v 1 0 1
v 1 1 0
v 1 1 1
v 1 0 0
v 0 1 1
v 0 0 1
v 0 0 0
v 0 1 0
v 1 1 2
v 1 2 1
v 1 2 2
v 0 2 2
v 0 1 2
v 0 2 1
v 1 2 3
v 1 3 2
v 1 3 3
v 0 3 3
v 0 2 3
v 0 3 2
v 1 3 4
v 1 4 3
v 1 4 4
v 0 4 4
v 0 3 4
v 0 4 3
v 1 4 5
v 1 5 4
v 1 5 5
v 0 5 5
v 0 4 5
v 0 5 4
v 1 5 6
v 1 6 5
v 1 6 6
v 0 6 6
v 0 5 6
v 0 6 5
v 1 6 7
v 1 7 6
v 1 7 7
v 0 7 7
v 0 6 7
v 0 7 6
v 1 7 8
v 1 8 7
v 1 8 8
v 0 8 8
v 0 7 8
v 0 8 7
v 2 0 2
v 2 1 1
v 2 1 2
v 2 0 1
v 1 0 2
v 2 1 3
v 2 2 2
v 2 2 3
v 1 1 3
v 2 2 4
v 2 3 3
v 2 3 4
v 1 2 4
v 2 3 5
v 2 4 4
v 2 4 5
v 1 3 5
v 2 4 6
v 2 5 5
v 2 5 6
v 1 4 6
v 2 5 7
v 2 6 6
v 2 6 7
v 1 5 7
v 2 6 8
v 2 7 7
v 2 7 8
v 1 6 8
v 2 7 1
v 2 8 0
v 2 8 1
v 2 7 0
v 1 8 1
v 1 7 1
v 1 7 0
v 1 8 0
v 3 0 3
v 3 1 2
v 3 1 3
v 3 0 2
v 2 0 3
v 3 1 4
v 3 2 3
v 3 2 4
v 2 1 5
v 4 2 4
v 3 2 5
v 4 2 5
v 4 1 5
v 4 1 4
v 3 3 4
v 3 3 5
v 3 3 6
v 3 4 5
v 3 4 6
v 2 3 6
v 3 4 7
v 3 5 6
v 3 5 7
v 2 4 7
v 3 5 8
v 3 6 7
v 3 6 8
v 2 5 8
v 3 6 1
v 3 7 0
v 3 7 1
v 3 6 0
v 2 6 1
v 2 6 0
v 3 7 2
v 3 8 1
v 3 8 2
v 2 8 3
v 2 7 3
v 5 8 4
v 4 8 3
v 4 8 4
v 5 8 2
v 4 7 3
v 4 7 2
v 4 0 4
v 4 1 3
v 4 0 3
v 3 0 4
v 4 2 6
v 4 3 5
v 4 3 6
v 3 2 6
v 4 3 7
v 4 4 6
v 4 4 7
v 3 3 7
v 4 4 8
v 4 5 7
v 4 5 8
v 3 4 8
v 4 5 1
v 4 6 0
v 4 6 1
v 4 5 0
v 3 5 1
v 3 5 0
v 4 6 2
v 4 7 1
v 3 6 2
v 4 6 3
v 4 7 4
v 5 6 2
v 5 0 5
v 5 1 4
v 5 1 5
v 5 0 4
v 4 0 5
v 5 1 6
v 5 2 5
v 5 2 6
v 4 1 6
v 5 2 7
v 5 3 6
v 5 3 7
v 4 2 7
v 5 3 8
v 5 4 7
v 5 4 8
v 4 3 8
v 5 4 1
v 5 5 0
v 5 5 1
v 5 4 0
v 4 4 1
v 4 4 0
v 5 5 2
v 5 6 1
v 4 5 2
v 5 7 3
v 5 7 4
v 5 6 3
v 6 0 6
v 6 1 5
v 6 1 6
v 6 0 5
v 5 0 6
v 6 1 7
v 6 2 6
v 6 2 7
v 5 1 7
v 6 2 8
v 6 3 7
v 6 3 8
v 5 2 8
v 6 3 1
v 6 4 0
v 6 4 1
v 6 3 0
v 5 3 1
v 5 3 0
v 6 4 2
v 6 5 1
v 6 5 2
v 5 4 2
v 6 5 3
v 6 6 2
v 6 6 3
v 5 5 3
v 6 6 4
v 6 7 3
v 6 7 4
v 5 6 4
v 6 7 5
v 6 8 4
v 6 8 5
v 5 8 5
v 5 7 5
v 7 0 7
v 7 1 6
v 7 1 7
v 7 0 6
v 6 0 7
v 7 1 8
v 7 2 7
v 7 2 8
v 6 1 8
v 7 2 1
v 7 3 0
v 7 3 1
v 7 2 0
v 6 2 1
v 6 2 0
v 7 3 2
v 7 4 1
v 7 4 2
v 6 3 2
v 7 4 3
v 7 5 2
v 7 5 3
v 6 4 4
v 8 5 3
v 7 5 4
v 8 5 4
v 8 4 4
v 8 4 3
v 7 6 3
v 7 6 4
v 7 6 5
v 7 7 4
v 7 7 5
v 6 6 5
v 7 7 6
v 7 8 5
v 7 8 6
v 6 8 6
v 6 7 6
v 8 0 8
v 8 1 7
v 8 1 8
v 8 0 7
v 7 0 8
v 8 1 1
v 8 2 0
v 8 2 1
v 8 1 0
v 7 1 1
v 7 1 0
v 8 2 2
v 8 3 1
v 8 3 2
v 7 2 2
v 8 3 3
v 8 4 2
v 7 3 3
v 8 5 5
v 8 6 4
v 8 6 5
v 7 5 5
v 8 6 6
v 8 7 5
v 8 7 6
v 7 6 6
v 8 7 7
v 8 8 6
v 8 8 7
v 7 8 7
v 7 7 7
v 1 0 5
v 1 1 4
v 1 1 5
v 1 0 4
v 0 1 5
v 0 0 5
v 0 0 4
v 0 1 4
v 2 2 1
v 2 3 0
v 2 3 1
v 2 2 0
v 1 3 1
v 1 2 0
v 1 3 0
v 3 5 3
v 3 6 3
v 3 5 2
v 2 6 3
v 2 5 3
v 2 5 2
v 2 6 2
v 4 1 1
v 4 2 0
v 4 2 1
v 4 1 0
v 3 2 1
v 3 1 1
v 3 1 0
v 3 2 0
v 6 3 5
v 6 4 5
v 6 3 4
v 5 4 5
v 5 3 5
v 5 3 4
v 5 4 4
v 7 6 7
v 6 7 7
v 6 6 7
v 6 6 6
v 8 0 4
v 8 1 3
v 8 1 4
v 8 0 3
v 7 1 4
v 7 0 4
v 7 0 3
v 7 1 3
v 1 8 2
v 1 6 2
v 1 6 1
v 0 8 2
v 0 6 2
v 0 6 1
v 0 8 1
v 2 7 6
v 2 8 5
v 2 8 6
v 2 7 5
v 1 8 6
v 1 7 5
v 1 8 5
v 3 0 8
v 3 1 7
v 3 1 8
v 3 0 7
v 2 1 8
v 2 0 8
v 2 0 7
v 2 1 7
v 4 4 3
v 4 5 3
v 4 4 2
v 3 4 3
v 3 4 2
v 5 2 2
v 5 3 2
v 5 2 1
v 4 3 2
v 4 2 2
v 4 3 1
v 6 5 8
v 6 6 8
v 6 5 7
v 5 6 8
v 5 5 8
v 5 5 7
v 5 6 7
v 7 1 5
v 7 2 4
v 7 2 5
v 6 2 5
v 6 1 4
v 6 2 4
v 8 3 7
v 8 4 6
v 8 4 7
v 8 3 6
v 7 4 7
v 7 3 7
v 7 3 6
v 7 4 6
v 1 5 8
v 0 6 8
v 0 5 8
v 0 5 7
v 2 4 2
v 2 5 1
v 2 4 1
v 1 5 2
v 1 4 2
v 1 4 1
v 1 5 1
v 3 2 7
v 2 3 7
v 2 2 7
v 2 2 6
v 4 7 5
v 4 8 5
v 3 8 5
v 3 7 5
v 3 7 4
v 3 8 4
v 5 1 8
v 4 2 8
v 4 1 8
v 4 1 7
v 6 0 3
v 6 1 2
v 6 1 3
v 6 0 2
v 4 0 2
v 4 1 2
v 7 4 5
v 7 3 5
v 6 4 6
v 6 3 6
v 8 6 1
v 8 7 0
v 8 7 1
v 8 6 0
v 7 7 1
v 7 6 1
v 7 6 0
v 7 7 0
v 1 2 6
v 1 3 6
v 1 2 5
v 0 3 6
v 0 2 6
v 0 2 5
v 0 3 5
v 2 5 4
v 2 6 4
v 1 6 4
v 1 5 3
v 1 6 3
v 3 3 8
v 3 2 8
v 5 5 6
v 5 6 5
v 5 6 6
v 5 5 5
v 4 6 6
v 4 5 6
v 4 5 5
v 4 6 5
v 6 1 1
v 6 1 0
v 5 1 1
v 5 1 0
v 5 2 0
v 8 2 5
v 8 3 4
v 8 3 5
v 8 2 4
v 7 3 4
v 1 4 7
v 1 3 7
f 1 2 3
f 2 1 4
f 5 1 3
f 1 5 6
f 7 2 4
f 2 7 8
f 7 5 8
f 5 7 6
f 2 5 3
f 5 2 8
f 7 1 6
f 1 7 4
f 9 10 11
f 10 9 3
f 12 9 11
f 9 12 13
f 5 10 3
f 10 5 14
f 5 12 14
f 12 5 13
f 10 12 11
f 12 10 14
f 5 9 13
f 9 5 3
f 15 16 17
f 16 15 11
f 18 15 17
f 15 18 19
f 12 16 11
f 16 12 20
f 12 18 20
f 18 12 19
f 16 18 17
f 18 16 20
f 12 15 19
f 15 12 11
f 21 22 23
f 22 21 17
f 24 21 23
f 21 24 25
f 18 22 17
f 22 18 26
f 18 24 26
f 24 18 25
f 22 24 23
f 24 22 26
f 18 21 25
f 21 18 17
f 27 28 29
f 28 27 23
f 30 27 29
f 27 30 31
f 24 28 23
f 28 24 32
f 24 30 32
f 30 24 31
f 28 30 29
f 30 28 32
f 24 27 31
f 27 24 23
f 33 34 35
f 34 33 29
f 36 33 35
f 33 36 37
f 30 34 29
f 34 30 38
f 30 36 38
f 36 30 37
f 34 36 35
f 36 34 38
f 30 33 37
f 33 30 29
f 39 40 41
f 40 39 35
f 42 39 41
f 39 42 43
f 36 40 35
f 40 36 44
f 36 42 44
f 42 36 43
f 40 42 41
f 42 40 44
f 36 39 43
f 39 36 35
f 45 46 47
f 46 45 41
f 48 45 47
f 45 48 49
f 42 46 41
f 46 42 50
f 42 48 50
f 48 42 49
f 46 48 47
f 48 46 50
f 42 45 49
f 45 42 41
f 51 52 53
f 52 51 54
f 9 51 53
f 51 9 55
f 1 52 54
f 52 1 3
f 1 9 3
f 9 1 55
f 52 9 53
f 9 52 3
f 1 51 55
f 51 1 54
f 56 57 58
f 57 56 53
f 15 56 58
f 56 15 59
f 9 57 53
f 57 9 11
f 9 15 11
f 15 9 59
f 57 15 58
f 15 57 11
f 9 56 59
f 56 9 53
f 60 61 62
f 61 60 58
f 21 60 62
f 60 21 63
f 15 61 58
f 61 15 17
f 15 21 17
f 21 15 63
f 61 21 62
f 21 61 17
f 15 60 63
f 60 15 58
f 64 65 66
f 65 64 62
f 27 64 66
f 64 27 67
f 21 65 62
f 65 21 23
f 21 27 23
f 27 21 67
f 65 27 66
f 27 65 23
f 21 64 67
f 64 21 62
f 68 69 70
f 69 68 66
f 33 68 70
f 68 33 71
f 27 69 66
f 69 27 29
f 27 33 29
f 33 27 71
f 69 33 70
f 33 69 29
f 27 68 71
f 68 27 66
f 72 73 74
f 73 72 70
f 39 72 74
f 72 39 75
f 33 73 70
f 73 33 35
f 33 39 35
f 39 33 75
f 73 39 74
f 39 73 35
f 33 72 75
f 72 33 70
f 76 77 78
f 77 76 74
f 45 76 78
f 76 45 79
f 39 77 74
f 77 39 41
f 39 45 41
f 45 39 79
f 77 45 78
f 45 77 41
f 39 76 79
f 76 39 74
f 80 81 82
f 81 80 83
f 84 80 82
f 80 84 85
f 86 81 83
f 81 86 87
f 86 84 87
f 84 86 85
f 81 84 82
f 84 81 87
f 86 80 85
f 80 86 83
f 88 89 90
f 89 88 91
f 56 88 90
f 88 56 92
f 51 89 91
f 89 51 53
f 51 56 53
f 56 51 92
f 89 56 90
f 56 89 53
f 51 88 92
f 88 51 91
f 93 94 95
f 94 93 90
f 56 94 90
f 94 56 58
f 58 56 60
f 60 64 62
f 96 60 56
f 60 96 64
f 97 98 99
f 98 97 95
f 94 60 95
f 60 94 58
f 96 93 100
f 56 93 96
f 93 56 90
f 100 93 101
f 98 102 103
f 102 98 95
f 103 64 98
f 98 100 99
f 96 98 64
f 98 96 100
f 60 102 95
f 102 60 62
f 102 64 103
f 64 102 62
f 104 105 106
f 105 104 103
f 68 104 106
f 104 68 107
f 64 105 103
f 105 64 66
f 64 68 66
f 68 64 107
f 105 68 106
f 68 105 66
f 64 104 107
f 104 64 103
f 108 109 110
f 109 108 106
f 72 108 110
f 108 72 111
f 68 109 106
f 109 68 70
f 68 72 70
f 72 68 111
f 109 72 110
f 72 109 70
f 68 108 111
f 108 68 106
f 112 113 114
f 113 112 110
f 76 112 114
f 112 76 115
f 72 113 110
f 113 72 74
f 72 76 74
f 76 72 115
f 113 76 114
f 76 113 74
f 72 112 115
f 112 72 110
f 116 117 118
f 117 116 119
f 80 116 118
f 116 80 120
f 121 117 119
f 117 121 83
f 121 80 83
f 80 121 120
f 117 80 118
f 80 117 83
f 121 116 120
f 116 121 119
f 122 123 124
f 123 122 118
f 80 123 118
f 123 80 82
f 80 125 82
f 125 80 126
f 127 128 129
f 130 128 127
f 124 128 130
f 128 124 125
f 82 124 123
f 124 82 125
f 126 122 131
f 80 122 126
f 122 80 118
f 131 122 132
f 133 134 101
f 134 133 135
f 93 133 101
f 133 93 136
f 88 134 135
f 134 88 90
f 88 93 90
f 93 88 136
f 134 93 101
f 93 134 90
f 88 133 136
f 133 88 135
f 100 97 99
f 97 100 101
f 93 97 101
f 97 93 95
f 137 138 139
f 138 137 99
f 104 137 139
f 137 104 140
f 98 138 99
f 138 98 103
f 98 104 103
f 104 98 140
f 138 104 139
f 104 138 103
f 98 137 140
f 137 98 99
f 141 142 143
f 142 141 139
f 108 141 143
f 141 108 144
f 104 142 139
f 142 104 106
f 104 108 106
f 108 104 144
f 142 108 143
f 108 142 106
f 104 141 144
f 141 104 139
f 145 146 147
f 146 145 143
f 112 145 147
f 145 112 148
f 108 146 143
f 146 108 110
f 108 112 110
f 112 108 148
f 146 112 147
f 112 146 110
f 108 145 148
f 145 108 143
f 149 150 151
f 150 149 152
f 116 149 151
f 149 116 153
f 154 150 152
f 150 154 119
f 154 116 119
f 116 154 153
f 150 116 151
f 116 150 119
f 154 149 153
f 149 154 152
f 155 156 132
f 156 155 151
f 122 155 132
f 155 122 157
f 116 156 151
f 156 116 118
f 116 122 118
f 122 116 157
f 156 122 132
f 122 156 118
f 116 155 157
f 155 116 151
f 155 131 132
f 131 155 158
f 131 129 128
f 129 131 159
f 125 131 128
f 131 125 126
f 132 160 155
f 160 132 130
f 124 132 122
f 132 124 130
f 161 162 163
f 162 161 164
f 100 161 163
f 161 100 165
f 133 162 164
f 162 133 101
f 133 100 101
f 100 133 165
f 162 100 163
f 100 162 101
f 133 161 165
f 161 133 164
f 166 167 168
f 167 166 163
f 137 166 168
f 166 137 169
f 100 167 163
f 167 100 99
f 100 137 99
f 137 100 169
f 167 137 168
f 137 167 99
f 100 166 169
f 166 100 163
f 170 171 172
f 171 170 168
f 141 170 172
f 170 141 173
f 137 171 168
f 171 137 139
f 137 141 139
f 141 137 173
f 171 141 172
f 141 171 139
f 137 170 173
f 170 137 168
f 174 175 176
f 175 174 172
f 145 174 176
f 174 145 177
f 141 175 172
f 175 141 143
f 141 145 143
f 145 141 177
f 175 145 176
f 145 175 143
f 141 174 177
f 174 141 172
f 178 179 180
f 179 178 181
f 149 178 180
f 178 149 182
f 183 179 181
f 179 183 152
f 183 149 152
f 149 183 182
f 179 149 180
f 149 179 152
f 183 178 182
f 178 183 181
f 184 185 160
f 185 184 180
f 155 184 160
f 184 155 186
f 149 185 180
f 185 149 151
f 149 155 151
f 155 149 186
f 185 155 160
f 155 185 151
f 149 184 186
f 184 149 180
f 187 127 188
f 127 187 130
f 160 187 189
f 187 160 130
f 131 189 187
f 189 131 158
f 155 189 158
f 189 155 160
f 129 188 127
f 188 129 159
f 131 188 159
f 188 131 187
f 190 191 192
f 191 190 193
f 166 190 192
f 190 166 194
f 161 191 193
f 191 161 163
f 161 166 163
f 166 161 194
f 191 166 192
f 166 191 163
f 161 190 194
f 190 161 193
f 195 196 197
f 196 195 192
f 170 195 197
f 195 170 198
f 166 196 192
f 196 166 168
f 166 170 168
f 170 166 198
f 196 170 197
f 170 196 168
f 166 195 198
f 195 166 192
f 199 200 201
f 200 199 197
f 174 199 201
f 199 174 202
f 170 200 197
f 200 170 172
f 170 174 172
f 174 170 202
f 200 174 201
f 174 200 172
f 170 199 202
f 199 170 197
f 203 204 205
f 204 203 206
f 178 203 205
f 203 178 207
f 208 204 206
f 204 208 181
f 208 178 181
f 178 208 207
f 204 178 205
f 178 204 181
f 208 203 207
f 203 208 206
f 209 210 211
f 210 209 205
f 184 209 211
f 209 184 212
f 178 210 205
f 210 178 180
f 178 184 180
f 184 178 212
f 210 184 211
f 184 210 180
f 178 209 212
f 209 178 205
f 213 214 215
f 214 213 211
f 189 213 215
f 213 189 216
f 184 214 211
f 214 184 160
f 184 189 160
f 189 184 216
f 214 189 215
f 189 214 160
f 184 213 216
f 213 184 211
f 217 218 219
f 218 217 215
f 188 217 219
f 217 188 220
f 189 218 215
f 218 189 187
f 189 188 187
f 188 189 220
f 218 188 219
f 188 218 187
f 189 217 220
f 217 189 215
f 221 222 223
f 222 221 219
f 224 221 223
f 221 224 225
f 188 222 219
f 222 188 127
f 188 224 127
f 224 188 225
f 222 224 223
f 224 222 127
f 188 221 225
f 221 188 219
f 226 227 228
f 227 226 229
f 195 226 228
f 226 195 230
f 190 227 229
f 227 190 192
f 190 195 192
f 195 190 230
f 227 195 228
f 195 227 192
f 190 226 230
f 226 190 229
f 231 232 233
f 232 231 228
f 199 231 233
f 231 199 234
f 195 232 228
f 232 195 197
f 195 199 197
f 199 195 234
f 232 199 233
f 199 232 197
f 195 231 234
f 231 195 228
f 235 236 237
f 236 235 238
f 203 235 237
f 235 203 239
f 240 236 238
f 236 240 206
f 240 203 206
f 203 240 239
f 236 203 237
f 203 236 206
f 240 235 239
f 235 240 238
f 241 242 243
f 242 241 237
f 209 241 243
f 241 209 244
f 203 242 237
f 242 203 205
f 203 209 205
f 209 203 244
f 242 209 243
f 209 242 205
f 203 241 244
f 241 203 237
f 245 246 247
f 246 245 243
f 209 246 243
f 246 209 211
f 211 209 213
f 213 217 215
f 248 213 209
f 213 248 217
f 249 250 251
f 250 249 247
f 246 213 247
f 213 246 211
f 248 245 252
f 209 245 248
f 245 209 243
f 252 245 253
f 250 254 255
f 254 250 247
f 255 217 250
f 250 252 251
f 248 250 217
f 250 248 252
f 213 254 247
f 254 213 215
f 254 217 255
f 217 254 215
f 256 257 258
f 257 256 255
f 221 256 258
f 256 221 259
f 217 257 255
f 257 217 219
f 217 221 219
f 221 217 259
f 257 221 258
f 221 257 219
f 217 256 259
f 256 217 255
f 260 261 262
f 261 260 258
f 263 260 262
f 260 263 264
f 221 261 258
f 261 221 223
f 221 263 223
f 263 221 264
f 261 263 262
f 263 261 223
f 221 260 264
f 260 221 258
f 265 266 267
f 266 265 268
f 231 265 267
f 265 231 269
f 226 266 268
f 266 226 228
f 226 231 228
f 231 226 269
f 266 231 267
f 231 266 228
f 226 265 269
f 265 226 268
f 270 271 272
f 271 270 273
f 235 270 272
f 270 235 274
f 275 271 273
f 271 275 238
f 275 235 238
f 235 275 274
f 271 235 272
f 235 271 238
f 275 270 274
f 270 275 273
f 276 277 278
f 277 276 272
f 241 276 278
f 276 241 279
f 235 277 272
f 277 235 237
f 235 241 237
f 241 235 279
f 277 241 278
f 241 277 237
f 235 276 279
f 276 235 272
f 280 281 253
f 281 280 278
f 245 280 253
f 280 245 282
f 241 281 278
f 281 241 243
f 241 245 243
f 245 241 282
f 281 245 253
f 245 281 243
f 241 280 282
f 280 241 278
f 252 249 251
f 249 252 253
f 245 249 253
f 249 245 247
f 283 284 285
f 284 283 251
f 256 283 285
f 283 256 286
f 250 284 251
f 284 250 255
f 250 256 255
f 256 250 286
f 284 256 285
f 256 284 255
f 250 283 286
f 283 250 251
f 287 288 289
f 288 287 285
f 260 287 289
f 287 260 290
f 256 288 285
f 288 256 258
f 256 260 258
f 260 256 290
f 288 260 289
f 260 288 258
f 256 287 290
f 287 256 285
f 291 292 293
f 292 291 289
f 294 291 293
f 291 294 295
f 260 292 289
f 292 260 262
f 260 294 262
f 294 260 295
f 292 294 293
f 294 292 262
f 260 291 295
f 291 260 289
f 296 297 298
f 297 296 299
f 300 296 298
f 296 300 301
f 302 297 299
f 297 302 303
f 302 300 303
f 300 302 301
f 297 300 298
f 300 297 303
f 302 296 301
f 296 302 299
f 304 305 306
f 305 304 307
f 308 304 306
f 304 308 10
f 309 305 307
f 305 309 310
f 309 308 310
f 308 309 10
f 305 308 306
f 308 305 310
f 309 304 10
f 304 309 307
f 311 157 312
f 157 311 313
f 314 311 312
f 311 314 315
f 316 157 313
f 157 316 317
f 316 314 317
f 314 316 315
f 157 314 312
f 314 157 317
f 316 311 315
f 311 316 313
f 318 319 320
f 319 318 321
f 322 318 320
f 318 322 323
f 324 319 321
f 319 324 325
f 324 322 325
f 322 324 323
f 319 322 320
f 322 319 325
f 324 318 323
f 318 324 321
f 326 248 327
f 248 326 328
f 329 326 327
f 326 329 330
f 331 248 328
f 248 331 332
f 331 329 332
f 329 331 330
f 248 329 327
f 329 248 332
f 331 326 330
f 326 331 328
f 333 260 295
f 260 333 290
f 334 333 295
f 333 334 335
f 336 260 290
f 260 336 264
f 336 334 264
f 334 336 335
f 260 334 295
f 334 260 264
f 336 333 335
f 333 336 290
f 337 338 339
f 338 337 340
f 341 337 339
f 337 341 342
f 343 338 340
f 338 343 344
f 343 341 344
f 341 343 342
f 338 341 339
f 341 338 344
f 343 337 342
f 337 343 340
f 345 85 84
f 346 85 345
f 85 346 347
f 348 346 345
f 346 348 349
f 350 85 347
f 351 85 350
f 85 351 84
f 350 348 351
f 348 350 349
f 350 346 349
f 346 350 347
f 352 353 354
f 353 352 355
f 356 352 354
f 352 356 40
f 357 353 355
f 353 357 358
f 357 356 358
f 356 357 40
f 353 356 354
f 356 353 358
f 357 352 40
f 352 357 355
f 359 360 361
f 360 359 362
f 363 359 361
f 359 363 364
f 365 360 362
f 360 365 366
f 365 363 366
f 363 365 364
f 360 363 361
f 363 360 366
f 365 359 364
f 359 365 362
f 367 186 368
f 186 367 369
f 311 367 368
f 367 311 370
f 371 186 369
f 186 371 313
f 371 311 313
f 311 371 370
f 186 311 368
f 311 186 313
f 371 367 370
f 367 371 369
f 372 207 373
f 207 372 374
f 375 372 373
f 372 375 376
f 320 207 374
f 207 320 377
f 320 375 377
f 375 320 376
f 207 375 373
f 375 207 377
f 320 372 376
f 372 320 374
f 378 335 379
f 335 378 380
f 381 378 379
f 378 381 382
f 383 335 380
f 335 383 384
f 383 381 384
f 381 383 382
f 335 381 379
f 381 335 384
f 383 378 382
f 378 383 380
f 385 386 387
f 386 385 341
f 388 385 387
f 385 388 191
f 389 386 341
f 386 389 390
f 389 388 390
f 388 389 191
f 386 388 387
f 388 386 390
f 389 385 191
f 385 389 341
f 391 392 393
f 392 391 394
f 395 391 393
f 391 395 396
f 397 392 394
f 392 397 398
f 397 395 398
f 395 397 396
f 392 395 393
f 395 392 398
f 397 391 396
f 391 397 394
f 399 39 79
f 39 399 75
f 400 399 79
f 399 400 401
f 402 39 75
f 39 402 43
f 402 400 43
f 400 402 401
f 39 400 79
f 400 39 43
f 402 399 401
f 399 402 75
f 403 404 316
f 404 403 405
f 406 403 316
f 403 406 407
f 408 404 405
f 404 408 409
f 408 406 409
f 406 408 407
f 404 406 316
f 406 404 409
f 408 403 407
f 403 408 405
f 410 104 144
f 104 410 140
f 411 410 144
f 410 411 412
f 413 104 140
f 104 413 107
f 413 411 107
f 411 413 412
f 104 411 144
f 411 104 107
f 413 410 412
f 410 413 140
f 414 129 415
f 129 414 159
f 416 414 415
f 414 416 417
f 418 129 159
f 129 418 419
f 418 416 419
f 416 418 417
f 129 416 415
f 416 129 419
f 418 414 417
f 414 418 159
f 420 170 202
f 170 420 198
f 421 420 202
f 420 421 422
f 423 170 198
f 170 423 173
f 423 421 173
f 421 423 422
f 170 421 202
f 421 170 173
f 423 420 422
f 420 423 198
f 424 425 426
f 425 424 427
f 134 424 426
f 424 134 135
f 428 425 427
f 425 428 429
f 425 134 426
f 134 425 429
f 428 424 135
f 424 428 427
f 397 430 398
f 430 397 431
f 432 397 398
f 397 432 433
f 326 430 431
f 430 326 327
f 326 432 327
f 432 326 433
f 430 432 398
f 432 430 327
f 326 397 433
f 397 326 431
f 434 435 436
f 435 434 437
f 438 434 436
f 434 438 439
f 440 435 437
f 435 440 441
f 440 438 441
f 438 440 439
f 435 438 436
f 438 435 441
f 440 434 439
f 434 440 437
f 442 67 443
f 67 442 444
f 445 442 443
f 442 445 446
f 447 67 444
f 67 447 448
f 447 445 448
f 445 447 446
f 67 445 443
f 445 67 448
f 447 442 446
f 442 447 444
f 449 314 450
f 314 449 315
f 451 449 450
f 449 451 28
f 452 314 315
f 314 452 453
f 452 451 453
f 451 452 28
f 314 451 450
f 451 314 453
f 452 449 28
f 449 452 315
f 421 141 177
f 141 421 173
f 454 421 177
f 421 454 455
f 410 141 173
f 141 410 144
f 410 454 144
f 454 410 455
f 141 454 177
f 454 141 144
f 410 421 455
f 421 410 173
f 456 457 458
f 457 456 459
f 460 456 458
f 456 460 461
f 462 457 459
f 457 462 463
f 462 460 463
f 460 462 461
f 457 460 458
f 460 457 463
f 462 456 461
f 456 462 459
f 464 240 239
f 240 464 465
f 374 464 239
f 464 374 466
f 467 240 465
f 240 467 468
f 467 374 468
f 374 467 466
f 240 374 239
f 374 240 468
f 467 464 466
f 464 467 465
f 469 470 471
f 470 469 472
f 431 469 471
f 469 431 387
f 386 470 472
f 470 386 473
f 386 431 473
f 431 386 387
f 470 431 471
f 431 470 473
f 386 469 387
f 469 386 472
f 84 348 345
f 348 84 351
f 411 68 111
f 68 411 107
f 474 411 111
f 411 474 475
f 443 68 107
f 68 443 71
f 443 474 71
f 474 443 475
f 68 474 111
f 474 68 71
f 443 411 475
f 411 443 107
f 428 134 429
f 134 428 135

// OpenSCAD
union() {
    translate([0, 0, 0]) cube([1, 1, 1]);
    translate([0, 1, 1]) cube([1, 1, 1]);
    translate([0, 2, 2]) cube([1, 1, 1]);
    translate([0, 3, 3]) cube([1, 1, 1]);
    translate([0, 4, 4]) cube([1, 1, 1]);
    translate([0, 5, 5]) cube([1, 1, 1]);
    translate([0, 6, 6]) cube([1, 1, 1]);
    translate([0, 7, 7]) cube([1, 1, 1]);
    translate([1, 0, 1]) cube([1, 1, 1]);
    translate([1, 1, 2]) cube([1, 1, 1]);
    translate([1, 2, 3]) cube([1, 1, 1]);
    translate([1, 3, 4]) cube([1, 1, 1]);
    translate([1, 4, 5]) cube([1, 1, 1]);
    translate([1, 5, 6]) cube([1, 1, 1]);
    translate([1, 6, 7]) cube([1, 1, 1]);
    translate([1, 7, 0]) cube([1, 1, 1]);
    translate([2, 0, 2]) cube([1, 1, 1]);
    translate([2, 1, 3]) cube([1, 1, 1]);
    translate([2, 2, 4]) cube([1, 1, 1]);
    translate([2, 3, 5]) cube([1, 1, 1]);
    translate([2, 4, 6]) cube([1, 1, 1]);
    translate([2, 5, 7]) cube([1, 1, 1]);
    translate([2, 6, 0]) cube([1, 1, 1]);
    translate([2, 7, 1]) cube([1, 1, 1]);
    translate([3, 0, 3]) cube([1, 1, 1]);
    translate([3, 1, 4]) cube([1, 1, 1]);
    translate([3, 2, 5]) cube([1, 1, 1]);
    translate([3, 3, 6]) cube([1, 1, 1]);
    translate([3, 4, 7]) cube([1, 1, 1]);
    translate([3, 5, 0]) cube([1, 1, 1]);
    translate([3, 6, 1]) cube([1, 1, 1]);
    translate([3, 7, 2]) cube([1, 1, 1]);
    translate([4, 0, 4]) cube([1, 1, 1]);
    translate([4, 1, 5]) cube([1, 1, 1]);
    translate([4, 2, 6]) cube([1, 1, 1]);
    translate([4, 3, 7]) cube([1, 1, 1]);
    translate([4, 4, 0]) cube([1, 1, 1]);
    translate([4, 5, 1]) cube([1, 1, 1]);
    translate([4, 6, 2]) cube([1, 1, 1]);
    translate([4, 7, 3]) cube([1, 1, 1]);
    translate([5, 0, 5]) cube([1, 1, 1]);
    translate([5, 1, 6]) cube([1, 1, 1]);
    translate([5, 2, 7]) cube([1, 1, 1]);
    translate([5, 3, 0]) cube([1, 1, 1]);
    translate([5, 4, 1]) cube([1, 1, 1]);
    translate([5, 5, 2]) cube([1, 1, 1]);
    translate([5, 6, 3]) cube([1, 1, 1]);
    translate([5, 7, 4]) cube([1, 1, 1]);
    translate([6, 0, 6]) cube([1, 1, 1]);
    translate([6, 1, 7]) cube([1, 1, 1]);
    translate([6, 2, 0]) cube([1, 1, 1]);
    translate([6, 3, 1]) cube([1, 1, 1]);
    translate([6, 4, 2]) cube([1, 1, 1]);
    translate([6, 5, 3]) cube([1, 1, 1]);
    translate([6, 6, 4]) cube([1, 1, 1]);
    translate([6, 7, 5]) cube([1, 1, 1]);
    translate([7, 0, 7]) cube([1, 1, 1]);
    translate([7, 1, 0]) cube([1, 1, 1]);
    translate([7, 2, 1]) cube([1, 1, 1]);
    translate([7, 3, 2]) cube([1, 1, 1]);
    translate([7, 4, 3]) cube([1, 1, 1]);
    translate([7, 5, 4]) cube([1, 1, 1]);
    translate([7, 6, 5]) cube([1, 1, 1]);
    translate([7, 7, 6]) cube([1, 1, 1]);
    translate([0, 0, 4]) cube([1, 1, 1]);
    translate([1, 2, 0]) cube([1, 1, 1]);
    translate([2, 5, 2]) cube([1, 1, 1]);
    translate([3, 1, 0]) cube([1, 1, 1]);
    translate([4, 7, 2]) cube([1, 1, 1]);
    translate([5, 3, 4]) cube([1, 1, 1]);
    translate([6, 6, 6]) cube([1, 1, 1]);
    translate([7, 0, 3]) cube([1, 1, 1]);
    translate([0, 6, 1]) cube([1, 1, 1]);
    translate([1, 7, 5]) cube([1, 1, 1]);
    translate([2, 0, 7]) cube([1, 1, 1]);
    translate([3, 4, 2]) cube([1, 1, 1]);
    translate([4, 2, 1]) cube([1, 1, 1]);
    translate([5, 5, 7]) cube([1, 1, 1]);
    translate([6, 1, 4]) cube([1, 1, 1]);
    translate([7, 3, 6]) cube([1, 1, 1]);
    translate([0, 5, 7]) cube([1, 1, 1]);
    translate([1, 4, 1]) cube([1, 1, 1]);
    translate([2, 2, 6]) cube([1, 1, 1]);
    translate([3, 7, 4]) cube([1, 1, 1]);
    translate([4, 1, 7]) cube([1, 1, 1]);
    translate([5, 0, 2]) cube([1, 1, 1]);
    translate([6, 3, 5]) cube([1, 1, 1]);
    translate([7, 6, 0]) cube([1, 1, 1]);
    translate([0, 2, 5]) cube([1, 1, 1]);
    translate([1, 5, 3]) cube([1, 1, 1]);
    translate([2, 7, 2]) cube([1, 1, 1]);
    translate([3, 2, 7]) cube([1, 1, 1]);
    translate([4, 5, 5]) cube([1, 1, 1]);
    translate([5, 1, 0]) cube([1, 1, 1]);
    translate([6, 4, 3]) cube([1, 1, 1]);
    translate([7, 2, 4]) cube([1, 1, 1]);
    translate([0, 7, 1]) cube([1, 1, 1]);
    translate([1, 3, 6]) cube([1, 1, 1]);
    translate([2, 1, 4]) cube([1, 1, 1]);
    translate([4, 0, 2]) cube([1, 1, 1]);
}
